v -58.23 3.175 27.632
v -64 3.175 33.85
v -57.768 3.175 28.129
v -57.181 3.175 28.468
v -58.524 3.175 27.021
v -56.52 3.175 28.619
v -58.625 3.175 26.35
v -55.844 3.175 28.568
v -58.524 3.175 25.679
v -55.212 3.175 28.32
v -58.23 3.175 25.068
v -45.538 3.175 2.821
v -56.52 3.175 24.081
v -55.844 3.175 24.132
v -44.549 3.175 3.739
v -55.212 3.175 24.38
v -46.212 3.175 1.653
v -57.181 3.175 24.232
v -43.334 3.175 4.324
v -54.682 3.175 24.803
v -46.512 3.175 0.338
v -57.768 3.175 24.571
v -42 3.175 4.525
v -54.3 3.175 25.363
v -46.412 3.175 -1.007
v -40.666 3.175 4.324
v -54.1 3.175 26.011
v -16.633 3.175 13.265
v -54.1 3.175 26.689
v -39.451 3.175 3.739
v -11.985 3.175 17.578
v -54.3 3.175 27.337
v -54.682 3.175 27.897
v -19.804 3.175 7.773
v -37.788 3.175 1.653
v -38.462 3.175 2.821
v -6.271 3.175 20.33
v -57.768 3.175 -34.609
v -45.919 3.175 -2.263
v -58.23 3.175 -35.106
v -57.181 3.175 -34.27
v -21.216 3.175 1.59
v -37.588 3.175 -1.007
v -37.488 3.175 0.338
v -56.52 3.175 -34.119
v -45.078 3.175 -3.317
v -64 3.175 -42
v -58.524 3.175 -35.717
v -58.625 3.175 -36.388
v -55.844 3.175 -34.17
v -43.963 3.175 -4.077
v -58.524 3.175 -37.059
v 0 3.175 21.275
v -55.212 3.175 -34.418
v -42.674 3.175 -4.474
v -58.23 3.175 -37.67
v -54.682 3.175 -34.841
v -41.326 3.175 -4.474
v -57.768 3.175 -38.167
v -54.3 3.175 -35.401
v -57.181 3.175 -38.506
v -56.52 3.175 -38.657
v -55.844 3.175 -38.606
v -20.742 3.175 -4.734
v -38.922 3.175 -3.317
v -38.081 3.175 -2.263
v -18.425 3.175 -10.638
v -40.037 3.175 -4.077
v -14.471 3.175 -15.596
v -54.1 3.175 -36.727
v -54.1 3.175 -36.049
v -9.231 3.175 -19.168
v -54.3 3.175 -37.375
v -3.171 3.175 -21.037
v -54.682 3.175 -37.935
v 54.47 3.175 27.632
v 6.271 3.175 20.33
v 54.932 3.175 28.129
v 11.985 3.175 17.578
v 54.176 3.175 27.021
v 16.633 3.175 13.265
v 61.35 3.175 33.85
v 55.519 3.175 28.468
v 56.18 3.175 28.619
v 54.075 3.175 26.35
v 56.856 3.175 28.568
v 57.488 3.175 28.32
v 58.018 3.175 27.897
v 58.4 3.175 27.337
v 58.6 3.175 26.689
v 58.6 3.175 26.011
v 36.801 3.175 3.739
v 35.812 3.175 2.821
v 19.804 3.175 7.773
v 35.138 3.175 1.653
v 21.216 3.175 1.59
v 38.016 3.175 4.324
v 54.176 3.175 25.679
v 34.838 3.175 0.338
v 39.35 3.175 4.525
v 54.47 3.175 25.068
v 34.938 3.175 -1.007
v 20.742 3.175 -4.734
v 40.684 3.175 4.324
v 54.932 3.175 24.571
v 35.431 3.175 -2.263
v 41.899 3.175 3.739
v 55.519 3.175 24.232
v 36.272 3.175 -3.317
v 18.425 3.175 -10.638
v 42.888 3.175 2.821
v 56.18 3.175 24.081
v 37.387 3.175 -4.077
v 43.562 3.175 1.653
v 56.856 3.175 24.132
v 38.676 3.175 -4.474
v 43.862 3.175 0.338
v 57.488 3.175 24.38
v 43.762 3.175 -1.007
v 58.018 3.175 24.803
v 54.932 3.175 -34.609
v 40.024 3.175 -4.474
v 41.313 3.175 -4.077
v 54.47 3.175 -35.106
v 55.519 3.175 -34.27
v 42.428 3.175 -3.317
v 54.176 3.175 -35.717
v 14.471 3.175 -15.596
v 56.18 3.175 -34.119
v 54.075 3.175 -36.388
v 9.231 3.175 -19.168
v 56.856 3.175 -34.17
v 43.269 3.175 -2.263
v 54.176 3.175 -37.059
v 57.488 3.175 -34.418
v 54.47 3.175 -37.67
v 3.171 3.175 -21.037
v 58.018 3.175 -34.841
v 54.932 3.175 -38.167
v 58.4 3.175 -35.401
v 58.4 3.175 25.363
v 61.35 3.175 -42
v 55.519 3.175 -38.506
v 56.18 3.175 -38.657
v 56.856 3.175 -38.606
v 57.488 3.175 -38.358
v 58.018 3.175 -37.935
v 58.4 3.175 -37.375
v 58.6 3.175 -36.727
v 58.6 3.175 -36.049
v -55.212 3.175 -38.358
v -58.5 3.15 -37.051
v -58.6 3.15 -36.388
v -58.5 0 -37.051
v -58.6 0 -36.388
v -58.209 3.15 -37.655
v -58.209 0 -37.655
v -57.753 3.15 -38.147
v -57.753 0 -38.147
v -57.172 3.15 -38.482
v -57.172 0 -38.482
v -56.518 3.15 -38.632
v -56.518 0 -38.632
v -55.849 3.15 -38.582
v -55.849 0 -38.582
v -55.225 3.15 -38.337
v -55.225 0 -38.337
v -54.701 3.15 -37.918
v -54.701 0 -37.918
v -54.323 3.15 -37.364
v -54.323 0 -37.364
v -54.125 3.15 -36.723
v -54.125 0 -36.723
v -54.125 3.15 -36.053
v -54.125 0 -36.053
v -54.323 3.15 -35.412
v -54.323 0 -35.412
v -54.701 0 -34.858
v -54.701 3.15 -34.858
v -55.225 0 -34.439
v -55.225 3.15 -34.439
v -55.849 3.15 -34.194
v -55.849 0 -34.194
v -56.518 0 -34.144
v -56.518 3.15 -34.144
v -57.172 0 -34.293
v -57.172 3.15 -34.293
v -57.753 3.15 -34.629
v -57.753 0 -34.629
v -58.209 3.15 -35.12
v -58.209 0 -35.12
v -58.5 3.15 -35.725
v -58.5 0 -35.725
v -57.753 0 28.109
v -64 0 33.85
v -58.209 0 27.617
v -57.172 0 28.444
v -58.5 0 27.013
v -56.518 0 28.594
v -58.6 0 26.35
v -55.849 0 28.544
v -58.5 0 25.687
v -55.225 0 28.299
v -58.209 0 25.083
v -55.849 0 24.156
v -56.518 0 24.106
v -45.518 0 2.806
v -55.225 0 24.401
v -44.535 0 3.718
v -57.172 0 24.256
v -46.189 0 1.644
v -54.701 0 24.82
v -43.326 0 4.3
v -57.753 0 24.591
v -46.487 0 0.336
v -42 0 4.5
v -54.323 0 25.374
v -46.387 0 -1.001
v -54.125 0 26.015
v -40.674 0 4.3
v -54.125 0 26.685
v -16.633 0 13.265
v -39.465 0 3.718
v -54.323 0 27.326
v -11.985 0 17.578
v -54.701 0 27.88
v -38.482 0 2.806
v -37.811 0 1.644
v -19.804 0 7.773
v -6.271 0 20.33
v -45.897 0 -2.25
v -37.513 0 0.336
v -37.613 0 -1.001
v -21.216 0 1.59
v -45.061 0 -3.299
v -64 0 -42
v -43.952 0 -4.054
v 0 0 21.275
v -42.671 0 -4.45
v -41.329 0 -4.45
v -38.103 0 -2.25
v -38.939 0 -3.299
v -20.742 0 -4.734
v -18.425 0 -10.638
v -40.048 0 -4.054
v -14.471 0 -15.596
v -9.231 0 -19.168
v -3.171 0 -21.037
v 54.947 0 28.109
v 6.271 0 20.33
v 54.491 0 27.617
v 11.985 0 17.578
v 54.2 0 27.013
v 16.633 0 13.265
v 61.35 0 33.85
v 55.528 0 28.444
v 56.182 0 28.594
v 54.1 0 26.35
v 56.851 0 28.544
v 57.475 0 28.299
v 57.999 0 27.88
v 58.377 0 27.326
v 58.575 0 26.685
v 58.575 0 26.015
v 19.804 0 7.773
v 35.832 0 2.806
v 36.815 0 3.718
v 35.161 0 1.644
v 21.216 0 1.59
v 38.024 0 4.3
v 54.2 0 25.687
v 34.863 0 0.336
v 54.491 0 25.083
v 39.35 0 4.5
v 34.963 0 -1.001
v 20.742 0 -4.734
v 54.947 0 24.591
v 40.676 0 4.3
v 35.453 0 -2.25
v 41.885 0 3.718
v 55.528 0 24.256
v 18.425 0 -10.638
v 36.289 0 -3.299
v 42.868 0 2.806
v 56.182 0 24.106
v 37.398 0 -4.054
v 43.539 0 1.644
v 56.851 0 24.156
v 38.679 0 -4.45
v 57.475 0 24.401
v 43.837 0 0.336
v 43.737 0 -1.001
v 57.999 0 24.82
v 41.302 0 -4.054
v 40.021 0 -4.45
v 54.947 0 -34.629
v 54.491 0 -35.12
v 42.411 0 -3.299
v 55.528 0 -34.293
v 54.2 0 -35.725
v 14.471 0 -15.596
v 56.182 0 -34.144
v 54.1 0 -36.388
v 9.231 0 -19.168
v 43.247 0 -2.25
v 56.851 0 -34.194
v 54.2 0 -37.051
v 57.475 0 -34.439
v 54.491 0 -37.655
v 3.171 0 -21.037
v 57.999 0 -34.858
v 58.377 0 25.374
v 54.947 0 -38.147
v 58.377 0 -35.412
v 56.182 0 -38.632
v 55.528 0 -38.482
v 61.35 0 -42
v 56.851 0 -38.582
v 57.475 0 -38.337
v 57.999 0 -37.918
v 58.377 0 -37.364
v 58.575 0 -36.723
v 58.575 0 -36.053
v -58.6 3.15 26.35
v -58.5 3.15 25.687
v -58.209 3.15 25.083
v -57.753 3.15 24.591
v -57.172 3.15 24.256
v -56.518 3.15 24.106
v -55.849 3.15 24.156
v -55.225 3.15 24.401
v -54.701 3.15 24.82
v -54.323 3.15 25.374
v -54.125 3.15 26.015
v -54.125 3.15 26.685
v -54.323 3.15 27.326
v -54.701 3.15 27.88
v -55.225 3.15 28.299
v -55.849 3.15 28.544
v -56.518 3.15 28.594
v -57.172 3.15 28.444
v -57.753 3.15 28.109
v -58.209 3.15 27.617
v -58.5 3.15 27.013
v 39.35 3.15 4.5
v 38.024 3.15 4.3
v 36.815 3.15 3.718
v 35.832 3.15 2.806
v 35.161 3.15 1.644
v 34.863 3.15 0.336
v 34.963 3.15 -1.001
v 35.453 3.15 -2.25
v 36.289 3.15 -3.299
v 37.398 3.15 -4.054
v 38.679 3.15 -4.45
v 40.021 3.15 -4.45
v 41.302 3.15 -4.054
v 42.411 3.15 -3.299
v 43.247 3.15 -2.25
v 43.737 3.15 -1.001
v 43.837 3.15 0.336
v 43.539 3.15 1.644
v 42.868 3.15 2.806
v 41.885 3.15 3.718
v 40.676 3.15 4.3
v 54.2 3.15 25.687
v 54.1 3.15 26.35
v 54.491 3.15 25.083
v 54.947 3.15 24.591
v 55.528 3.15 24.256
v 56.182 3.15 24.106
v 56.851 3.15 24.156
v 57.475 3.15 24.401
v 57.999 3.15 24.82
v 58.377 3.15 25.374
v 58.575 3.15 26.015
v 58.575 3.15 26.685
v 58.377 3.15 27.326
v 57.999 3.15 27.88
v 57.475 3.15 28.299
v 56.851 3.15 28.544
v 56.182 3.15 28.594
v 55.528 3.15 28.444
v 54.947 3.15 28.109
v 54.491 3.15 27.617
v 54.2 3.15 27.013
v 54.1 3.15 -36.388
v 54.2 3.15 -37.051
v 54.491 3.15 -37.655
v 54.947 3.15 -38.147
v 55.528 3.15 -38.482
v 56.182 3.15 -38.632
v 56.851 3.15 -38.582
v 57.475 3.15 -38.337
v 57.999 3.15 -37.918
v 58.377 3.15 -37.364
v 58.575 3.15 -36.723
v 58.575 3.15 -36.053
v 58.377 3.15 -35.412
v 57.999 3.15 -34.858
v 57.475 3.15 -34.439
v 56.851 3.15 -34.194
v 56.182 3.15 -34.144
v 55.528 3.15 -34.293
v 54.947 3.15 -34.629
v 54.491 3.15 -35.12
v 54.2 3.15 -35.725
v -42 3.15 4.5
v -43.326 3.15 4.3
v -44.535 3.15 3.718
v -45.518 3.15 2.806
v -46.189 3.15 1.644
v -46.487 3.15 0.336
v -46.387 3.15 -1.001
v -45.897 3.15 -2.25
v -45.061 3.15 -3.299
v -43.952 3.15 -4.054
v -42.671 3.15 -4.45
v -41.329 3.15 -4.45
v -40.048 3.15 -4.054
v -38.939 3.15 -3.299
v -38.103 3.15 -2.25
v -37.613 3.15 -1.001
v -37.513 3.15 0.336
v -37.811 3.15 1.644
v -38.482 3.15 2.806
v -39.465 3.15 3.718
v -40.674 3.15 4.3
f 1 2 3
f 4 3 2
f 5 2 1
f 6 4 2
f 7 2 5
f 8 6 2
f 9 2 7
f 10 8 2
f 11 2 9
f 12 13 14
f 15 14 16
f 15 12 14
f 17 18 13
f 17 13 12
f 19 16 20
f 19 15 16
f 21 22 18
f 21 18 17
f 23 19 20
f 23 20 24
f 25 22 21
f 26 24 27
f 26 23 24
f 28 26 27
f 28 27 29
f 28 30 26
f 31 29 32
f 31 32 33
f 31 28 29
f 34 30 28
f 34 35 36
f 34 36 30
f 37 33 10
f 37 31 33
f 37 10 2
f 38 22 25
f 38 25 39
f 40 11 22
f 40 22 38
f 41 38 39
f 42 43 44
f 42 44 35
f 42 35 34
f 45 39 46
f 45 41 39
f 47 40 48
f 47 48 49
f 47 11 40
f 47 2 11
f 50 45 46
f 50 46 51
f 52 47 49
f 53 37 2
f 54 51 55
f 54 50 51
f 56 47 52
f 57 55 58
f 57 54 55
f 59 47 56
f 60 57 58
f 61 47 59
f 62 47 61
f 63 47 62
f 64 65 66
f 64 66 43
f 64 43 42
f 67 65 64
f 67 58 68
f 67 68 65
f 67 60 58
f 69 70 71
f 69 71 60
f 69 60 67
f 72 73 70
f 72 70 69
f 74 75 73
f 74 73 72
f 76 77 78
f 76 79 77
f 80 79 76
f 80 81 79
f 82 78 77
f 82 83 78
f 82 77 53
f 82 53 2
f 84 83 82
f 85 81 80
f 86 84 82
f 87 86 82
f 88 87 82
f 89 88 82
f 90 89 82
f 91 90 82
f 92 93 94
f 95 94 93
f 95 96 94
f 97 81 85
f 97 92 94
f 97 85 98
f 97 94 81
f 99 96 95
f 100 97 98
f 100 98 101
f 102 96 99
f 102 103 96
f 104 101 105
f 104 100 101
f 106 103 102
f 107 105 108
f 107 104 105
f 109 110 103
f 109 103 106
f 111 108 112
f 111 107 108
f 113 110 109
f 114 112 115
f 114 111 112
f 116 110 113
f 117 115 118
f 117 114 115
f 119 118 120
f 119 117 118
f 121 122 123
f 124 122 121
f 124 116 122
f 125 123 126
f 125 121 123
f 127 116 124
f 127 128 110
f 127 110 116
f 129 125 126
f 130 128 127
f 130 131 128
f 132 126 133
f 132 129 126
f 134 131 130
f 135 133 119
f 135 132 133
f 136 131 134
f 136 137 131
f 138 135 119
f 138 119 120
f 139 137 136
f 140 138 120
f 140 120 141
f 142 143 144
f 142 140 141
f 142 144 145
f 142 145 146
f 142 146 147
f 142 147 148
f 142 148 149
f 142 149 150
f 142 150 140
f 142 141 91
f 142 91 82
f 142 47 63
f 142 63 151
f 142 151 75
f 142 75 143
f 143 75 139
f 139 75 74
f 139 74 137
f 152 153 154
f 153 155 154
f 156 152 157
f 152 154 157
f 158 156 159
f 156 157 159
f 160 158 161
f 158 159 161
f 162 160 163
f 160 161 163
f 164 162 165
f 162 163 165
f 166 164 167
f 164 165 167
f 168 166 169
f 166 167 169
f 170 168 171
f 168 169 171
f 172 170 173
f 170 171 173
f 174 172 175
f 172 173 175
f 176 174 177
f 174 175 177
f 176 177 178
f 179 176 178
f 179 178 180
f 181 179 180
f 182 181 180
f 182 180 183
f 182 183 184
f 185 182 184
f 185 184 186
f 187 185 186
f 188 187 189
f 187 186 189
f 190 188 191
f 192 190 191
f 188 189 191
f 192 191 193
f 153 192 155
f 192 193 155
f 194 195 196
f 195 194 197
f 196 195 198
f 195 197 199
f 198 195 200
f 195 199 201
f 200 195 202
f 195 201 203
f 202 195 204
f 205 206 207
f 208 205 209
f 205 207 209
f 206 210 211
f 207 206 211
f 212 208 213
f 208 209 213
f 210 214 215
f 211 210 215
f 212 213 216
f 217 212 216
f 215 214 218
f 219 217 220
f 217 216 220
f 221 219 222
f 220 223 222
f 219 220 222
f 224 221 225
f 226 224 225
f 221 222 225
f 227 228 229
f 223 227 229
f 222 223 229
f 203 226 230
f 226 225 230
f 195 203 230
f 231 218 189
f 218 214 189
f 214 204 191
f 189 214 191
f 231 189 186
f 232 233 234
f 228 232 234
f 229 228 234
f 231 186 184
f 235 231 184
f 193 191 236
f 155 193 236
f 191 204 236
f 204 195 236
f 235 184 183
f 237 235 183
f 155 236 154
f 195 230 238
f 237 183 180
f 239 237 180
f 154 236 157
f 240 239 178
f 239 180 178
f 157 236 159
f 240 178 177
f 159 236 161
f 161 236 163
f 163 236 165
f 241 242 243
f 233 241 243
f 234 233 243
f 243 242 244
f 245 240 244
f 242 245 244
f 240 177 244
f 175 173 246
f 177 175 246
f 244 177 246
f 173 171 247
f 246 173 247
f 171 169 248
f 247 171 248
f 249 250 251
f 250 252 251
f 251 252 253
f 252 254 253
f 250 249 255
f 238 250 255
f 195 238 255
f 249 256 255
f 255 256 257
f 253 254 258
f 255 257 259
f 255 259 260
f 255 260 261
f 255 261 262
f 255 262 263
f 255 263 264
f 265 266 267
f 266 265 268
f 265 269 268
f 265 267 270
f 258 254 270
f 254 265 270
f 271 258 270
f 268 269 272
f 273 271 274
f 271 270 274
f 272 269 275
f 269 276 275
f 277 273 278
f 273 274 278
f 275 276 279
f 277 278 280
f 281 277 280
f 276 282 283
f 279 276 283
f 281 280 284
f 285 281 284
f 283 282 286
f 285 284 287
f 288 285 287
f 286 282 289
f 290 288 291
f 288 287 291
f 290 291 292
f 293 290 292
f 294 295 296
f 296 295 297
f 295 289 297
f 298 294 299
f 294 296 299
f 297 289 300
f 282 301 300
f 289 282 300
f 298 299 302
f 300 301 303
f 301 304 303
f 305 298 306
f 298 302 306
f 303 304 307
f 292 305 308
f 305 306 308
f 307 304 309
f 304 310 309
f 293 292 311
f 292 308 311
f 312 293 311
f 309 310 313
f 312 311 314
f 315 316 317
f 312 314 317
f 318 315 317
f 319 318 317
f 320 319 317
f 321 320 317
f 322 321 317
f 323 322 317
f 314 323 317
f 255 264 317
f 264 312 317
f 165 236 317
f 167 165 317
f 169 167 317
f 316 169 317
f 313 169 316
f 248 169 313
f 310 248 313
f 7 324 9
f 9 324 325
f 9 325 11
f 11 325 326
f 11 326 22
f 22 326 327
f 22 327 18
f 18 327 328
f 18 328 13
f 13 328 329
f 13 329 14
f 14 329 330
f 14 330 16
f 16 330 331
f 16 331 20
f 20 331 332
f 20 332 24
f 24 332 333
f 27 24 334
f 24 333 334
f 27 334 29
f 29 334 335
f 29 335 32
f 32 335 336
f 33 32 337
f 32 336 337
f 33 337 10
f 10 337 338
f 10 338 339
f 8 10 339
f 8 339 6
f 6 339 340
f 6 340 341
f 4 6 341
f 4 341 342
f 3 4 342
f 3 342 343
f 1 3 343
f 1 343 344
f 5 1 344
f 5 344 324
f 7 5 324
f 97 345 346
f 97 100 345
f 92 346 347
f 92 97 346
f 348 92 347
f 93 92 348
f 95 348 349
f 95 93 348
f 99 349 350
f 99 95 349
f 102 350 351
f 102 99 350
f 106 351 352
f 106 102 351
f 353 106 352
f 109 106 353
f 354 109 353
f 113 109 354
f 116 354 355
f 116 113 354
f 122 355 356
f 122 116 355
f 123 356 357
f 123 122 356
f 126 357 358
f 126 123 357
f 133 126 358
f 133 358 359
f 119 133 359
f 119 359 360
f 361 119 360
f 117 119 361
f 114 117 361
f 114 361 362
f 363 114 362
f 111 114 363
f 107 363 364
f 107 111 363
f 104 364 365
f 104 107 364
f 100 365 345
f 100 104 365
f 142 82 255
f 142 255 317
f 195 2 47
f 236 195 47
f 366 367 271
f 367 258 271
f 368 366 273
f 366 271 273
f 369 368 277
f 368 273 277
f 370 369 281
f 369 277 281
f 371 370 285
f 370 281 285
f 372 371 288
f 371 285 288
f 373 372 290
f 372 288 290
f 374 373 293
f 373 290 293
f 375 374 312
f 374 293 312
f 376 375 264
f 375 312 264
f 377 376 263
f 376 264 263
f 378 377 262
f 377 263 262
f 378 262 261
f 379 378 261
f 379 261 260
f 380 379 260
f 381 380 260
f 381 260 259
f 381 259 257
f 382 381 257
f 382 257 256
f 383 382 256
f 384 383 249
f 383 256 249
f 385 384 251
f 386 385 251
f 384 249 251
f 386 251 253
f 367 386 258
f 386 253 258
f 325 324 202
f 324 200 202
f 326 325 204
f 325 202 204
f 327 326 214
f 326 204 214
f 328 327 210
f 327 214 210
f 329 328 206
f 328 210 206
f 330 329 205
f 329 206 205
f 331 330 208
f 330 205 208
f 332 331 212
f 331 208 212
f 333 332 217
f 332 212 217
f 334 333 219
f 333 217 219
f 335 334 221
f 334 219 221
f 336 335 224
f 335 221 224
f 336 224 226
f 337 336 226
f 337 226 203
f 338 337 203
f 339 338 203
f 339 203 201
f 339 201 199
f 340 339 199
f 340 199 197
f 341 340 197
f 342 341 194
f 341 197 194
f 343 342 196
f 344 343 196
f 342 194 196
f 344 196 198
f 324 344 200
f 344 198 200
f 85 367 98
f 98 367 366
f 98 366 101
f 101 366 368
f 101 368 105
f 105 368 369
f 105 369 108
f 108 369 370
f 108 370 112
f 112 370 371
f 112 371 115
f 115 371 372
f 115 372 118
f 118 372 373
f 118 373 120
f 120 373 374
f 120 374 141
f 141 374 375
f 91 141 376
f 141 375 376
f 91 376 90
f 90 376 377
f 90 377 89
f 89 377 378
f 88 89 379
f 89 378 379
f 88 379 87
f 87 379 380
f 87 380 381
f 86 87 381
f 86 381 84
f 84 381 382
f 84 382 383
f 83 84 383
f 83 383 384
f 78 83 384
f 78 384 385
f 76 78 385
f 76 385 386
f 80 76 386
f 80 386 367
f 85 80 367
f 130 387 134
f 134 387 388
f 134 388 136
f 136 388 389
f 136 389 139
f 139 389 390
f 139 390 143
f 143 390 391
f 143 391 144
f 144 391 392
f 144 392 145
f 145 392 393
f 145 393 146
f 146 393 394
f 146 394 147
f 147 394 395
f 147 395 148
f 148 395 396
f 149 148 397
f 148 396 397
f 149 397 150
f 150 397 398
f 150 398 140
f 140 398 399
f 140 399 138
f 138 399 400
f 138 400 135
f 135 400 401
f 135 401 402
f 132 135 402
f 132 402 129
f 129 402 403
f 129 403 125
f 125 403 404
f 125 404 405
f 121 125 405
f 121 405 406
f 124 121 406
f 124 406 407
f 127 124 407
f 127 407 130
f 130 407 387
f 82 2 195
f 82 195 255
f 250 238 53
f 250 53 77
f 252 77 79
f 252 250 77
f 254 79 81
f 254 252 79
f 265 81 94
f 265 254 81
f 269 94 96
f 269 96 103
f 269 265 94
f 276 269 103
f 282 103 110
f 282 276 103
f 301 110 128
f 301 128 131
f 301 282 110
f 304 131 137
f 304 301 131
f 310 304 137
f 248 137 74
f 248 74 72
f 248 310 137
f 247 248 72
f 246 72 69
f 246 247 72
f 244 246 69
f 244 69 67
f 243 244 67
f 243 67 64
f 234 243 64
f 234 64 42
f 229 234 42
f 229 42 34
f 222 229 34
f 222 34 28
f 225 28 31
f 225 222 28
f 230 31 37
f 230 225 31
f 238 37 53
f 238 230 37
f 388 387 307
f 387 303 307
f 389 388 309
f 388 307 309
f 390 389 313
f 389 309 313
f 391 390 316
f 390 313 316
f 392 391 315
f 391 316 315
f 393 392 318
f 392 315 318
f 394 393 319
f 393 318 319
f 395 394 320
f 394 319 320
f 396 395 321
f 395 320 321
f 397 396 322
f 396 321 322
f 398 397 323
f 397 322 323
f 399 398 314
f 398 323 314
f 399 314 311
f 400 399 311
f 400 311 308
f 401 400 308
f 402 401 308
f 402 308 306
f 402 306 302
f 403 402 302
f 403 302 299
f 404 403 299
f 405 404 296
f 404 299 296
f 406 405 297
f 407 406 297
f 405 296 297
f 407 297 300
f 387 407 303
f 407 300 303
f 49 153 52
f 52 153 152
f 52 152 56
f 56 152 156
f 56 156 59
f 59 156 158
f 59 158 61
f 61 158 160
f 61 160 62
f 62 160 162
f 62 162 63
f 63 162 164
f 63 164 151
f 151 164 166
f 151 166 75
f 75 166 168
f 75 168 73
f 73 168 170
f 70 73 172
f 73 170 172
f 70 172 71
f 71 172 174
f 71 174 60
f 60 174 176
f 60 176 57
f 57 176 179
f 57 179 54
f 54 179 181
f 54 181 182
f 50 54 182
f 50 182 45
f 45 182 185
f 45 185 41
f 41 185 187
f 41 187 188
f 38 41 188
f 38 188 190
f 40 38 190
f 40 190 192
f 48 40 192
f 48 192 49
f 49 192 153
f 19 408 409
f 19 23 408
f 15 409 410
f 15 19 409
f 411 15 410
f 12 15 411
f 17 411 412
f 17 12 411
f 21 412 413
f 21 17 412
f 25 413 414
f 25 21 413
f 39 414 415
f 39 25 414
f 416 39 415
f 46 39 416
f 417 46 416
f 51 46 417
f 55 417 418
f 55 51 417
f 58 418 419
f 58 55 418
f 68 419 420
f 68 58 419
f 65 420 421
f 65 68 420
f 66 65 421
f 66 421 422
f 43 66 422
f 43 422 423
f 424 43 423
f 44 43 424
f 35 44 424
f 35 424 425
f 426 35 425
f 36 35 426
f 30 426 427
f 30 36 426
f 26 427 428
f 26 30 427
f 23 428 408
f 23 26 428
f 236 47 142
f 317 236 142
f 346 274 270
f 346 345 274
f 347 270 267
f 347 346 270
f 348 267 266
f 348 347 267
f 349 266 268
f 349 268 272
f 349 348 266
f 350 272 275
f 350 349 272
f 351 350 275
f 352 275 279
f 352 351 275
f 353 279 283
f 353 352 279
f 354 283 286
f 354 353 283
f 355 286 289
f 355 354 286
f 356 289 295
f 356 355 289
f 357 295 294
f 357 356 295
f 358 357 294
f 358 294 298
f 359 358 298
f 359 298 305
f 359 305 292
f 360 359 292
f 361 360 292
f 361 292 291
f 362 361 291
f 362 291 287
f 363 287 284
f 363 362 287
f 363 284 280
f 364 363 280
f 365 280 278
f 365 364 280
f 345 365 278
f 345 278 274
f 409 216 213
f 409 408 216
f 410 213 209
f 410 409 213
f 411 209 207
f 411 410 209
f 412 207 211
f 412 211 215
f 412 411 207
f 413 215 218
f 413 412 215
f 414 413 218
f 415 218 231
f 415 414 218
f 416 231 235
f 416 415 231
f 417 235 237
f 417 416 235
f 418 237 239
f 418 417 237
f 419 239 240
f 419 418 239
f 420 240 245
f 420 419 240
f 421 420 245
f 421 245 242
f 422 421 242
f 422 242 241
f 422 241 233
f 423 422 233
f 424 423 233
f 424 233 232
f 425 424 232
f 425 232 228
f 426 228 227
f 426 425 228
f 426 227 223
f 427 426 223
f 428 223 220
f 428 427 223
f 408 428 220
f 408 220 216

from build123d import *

# Parameters (mm, degrees)
SKETCH1_R                      = 21.275
BOSS_EXTRUDE1_DEPTH            = 3.175
M8_CLEARANCE_HOLE1_AT_2_COUNT  = 2
M8_CLEARANCE_HOLE1_AT_2_PITCH  = 81.35
SKETCH9_W                      = 125.35
SKETCH9_H                      = 8
SKETCH9_H_2                    = 2.5
BOSS_EXTRUDE2_DEPTH            = 3.175
M4_CLEARANCE_HOLE1_D           = 4.5
M4_CLEARANCE_HOLE1_CSINK_D     = 4.55
M4_CLEARANCE_HOLE1_CSINK_ANGLE = 90


with BuildPart() as part:
    # Sketch1 → Boss-Extrude1 (new body)
    with BuildSketch(Plane(origin=(0, 0, 0), x_dir=(1, 0, 0), z_dir=(0, 1, 0))):
        Polygon((-64, 0), (-64, 34), (61.35, 34), (61.35, 0), (61.35, -31.35), (-64, -31.35), align=None)
        with Locations(Location((0, 0, 0), (0, 0, 270))):
            Circle(SKETCH1_R, mode=Mode.SUBTRACT)
    extrude(amount=BOSS_EXTRUDE1_DEPTH)

    # Sketch4 → M8 Clearance Hole1 (revolve, cut)
    with BuildSketch(Plane(origin=(-42, 3.175, 0), x_dir=(0, 0, 1), z_dir=(1, 0, 0))):
        Polygon((0, 0), (0, 3.175), (4.5, 3.175), (4.5, 0.025), (4.525, 0), align=None)
    m8_clearance_hole1 = revolve(axis=Axis((-42, 9.525, 0), (0, -1, 0)), mode=Mode.SUBTRACT)

    # M8 Clearance Hole1 at 2: M8 Clearance Hole1 ×2
    with Locations(*[(i * M8_CLEARANCE_HOLE1_AT_2_PITCH, 0, 0) for i in range(1, M8_CLEARANCE_HOLE1_AT_2_COUNT)]):
        add(m8_clearance_hole1, mode=Mode.SUBTRACT)

    # Sketch9 → Boss-Extrude2 (add)
    with BuildSketch(Plane(origin=(0, 3.175, 0), x_dir=(1, 0, 0), z_dir=(0, 1, 0))):
        with Locations((-1.325, 38)):
            Rectangle(SKETCH9_W, SKETCH9_H)
        with Locations((-1.325, -32.6)):
            Rectangle(SKETCH9_W, SKETCH9_H_2)
    extrude(amount=-BOSS_EXTRUDE2_DEPTH)

    # M4 Clearance Hole1 (through all)
    with Locations(Plane(origin=(0, 3.175, 0), x_dir=(1, 0, 0), z_dir=(0, 1, 0))):
        with Locations((-56.35, 36.38795554), (-56.35, -26.35), (56.35, -26.35), (56.35, 36.38795554)):
            CounterSinkHole(M4_CLEARANCE_HOLE1_D / 2, M4_CLEARANCE_HOLE1_CSINK_D / 2, counter_sink_angle=M4_CLEARANCE_HOLE1_CSINK_ANGLE)


solid = part.part
